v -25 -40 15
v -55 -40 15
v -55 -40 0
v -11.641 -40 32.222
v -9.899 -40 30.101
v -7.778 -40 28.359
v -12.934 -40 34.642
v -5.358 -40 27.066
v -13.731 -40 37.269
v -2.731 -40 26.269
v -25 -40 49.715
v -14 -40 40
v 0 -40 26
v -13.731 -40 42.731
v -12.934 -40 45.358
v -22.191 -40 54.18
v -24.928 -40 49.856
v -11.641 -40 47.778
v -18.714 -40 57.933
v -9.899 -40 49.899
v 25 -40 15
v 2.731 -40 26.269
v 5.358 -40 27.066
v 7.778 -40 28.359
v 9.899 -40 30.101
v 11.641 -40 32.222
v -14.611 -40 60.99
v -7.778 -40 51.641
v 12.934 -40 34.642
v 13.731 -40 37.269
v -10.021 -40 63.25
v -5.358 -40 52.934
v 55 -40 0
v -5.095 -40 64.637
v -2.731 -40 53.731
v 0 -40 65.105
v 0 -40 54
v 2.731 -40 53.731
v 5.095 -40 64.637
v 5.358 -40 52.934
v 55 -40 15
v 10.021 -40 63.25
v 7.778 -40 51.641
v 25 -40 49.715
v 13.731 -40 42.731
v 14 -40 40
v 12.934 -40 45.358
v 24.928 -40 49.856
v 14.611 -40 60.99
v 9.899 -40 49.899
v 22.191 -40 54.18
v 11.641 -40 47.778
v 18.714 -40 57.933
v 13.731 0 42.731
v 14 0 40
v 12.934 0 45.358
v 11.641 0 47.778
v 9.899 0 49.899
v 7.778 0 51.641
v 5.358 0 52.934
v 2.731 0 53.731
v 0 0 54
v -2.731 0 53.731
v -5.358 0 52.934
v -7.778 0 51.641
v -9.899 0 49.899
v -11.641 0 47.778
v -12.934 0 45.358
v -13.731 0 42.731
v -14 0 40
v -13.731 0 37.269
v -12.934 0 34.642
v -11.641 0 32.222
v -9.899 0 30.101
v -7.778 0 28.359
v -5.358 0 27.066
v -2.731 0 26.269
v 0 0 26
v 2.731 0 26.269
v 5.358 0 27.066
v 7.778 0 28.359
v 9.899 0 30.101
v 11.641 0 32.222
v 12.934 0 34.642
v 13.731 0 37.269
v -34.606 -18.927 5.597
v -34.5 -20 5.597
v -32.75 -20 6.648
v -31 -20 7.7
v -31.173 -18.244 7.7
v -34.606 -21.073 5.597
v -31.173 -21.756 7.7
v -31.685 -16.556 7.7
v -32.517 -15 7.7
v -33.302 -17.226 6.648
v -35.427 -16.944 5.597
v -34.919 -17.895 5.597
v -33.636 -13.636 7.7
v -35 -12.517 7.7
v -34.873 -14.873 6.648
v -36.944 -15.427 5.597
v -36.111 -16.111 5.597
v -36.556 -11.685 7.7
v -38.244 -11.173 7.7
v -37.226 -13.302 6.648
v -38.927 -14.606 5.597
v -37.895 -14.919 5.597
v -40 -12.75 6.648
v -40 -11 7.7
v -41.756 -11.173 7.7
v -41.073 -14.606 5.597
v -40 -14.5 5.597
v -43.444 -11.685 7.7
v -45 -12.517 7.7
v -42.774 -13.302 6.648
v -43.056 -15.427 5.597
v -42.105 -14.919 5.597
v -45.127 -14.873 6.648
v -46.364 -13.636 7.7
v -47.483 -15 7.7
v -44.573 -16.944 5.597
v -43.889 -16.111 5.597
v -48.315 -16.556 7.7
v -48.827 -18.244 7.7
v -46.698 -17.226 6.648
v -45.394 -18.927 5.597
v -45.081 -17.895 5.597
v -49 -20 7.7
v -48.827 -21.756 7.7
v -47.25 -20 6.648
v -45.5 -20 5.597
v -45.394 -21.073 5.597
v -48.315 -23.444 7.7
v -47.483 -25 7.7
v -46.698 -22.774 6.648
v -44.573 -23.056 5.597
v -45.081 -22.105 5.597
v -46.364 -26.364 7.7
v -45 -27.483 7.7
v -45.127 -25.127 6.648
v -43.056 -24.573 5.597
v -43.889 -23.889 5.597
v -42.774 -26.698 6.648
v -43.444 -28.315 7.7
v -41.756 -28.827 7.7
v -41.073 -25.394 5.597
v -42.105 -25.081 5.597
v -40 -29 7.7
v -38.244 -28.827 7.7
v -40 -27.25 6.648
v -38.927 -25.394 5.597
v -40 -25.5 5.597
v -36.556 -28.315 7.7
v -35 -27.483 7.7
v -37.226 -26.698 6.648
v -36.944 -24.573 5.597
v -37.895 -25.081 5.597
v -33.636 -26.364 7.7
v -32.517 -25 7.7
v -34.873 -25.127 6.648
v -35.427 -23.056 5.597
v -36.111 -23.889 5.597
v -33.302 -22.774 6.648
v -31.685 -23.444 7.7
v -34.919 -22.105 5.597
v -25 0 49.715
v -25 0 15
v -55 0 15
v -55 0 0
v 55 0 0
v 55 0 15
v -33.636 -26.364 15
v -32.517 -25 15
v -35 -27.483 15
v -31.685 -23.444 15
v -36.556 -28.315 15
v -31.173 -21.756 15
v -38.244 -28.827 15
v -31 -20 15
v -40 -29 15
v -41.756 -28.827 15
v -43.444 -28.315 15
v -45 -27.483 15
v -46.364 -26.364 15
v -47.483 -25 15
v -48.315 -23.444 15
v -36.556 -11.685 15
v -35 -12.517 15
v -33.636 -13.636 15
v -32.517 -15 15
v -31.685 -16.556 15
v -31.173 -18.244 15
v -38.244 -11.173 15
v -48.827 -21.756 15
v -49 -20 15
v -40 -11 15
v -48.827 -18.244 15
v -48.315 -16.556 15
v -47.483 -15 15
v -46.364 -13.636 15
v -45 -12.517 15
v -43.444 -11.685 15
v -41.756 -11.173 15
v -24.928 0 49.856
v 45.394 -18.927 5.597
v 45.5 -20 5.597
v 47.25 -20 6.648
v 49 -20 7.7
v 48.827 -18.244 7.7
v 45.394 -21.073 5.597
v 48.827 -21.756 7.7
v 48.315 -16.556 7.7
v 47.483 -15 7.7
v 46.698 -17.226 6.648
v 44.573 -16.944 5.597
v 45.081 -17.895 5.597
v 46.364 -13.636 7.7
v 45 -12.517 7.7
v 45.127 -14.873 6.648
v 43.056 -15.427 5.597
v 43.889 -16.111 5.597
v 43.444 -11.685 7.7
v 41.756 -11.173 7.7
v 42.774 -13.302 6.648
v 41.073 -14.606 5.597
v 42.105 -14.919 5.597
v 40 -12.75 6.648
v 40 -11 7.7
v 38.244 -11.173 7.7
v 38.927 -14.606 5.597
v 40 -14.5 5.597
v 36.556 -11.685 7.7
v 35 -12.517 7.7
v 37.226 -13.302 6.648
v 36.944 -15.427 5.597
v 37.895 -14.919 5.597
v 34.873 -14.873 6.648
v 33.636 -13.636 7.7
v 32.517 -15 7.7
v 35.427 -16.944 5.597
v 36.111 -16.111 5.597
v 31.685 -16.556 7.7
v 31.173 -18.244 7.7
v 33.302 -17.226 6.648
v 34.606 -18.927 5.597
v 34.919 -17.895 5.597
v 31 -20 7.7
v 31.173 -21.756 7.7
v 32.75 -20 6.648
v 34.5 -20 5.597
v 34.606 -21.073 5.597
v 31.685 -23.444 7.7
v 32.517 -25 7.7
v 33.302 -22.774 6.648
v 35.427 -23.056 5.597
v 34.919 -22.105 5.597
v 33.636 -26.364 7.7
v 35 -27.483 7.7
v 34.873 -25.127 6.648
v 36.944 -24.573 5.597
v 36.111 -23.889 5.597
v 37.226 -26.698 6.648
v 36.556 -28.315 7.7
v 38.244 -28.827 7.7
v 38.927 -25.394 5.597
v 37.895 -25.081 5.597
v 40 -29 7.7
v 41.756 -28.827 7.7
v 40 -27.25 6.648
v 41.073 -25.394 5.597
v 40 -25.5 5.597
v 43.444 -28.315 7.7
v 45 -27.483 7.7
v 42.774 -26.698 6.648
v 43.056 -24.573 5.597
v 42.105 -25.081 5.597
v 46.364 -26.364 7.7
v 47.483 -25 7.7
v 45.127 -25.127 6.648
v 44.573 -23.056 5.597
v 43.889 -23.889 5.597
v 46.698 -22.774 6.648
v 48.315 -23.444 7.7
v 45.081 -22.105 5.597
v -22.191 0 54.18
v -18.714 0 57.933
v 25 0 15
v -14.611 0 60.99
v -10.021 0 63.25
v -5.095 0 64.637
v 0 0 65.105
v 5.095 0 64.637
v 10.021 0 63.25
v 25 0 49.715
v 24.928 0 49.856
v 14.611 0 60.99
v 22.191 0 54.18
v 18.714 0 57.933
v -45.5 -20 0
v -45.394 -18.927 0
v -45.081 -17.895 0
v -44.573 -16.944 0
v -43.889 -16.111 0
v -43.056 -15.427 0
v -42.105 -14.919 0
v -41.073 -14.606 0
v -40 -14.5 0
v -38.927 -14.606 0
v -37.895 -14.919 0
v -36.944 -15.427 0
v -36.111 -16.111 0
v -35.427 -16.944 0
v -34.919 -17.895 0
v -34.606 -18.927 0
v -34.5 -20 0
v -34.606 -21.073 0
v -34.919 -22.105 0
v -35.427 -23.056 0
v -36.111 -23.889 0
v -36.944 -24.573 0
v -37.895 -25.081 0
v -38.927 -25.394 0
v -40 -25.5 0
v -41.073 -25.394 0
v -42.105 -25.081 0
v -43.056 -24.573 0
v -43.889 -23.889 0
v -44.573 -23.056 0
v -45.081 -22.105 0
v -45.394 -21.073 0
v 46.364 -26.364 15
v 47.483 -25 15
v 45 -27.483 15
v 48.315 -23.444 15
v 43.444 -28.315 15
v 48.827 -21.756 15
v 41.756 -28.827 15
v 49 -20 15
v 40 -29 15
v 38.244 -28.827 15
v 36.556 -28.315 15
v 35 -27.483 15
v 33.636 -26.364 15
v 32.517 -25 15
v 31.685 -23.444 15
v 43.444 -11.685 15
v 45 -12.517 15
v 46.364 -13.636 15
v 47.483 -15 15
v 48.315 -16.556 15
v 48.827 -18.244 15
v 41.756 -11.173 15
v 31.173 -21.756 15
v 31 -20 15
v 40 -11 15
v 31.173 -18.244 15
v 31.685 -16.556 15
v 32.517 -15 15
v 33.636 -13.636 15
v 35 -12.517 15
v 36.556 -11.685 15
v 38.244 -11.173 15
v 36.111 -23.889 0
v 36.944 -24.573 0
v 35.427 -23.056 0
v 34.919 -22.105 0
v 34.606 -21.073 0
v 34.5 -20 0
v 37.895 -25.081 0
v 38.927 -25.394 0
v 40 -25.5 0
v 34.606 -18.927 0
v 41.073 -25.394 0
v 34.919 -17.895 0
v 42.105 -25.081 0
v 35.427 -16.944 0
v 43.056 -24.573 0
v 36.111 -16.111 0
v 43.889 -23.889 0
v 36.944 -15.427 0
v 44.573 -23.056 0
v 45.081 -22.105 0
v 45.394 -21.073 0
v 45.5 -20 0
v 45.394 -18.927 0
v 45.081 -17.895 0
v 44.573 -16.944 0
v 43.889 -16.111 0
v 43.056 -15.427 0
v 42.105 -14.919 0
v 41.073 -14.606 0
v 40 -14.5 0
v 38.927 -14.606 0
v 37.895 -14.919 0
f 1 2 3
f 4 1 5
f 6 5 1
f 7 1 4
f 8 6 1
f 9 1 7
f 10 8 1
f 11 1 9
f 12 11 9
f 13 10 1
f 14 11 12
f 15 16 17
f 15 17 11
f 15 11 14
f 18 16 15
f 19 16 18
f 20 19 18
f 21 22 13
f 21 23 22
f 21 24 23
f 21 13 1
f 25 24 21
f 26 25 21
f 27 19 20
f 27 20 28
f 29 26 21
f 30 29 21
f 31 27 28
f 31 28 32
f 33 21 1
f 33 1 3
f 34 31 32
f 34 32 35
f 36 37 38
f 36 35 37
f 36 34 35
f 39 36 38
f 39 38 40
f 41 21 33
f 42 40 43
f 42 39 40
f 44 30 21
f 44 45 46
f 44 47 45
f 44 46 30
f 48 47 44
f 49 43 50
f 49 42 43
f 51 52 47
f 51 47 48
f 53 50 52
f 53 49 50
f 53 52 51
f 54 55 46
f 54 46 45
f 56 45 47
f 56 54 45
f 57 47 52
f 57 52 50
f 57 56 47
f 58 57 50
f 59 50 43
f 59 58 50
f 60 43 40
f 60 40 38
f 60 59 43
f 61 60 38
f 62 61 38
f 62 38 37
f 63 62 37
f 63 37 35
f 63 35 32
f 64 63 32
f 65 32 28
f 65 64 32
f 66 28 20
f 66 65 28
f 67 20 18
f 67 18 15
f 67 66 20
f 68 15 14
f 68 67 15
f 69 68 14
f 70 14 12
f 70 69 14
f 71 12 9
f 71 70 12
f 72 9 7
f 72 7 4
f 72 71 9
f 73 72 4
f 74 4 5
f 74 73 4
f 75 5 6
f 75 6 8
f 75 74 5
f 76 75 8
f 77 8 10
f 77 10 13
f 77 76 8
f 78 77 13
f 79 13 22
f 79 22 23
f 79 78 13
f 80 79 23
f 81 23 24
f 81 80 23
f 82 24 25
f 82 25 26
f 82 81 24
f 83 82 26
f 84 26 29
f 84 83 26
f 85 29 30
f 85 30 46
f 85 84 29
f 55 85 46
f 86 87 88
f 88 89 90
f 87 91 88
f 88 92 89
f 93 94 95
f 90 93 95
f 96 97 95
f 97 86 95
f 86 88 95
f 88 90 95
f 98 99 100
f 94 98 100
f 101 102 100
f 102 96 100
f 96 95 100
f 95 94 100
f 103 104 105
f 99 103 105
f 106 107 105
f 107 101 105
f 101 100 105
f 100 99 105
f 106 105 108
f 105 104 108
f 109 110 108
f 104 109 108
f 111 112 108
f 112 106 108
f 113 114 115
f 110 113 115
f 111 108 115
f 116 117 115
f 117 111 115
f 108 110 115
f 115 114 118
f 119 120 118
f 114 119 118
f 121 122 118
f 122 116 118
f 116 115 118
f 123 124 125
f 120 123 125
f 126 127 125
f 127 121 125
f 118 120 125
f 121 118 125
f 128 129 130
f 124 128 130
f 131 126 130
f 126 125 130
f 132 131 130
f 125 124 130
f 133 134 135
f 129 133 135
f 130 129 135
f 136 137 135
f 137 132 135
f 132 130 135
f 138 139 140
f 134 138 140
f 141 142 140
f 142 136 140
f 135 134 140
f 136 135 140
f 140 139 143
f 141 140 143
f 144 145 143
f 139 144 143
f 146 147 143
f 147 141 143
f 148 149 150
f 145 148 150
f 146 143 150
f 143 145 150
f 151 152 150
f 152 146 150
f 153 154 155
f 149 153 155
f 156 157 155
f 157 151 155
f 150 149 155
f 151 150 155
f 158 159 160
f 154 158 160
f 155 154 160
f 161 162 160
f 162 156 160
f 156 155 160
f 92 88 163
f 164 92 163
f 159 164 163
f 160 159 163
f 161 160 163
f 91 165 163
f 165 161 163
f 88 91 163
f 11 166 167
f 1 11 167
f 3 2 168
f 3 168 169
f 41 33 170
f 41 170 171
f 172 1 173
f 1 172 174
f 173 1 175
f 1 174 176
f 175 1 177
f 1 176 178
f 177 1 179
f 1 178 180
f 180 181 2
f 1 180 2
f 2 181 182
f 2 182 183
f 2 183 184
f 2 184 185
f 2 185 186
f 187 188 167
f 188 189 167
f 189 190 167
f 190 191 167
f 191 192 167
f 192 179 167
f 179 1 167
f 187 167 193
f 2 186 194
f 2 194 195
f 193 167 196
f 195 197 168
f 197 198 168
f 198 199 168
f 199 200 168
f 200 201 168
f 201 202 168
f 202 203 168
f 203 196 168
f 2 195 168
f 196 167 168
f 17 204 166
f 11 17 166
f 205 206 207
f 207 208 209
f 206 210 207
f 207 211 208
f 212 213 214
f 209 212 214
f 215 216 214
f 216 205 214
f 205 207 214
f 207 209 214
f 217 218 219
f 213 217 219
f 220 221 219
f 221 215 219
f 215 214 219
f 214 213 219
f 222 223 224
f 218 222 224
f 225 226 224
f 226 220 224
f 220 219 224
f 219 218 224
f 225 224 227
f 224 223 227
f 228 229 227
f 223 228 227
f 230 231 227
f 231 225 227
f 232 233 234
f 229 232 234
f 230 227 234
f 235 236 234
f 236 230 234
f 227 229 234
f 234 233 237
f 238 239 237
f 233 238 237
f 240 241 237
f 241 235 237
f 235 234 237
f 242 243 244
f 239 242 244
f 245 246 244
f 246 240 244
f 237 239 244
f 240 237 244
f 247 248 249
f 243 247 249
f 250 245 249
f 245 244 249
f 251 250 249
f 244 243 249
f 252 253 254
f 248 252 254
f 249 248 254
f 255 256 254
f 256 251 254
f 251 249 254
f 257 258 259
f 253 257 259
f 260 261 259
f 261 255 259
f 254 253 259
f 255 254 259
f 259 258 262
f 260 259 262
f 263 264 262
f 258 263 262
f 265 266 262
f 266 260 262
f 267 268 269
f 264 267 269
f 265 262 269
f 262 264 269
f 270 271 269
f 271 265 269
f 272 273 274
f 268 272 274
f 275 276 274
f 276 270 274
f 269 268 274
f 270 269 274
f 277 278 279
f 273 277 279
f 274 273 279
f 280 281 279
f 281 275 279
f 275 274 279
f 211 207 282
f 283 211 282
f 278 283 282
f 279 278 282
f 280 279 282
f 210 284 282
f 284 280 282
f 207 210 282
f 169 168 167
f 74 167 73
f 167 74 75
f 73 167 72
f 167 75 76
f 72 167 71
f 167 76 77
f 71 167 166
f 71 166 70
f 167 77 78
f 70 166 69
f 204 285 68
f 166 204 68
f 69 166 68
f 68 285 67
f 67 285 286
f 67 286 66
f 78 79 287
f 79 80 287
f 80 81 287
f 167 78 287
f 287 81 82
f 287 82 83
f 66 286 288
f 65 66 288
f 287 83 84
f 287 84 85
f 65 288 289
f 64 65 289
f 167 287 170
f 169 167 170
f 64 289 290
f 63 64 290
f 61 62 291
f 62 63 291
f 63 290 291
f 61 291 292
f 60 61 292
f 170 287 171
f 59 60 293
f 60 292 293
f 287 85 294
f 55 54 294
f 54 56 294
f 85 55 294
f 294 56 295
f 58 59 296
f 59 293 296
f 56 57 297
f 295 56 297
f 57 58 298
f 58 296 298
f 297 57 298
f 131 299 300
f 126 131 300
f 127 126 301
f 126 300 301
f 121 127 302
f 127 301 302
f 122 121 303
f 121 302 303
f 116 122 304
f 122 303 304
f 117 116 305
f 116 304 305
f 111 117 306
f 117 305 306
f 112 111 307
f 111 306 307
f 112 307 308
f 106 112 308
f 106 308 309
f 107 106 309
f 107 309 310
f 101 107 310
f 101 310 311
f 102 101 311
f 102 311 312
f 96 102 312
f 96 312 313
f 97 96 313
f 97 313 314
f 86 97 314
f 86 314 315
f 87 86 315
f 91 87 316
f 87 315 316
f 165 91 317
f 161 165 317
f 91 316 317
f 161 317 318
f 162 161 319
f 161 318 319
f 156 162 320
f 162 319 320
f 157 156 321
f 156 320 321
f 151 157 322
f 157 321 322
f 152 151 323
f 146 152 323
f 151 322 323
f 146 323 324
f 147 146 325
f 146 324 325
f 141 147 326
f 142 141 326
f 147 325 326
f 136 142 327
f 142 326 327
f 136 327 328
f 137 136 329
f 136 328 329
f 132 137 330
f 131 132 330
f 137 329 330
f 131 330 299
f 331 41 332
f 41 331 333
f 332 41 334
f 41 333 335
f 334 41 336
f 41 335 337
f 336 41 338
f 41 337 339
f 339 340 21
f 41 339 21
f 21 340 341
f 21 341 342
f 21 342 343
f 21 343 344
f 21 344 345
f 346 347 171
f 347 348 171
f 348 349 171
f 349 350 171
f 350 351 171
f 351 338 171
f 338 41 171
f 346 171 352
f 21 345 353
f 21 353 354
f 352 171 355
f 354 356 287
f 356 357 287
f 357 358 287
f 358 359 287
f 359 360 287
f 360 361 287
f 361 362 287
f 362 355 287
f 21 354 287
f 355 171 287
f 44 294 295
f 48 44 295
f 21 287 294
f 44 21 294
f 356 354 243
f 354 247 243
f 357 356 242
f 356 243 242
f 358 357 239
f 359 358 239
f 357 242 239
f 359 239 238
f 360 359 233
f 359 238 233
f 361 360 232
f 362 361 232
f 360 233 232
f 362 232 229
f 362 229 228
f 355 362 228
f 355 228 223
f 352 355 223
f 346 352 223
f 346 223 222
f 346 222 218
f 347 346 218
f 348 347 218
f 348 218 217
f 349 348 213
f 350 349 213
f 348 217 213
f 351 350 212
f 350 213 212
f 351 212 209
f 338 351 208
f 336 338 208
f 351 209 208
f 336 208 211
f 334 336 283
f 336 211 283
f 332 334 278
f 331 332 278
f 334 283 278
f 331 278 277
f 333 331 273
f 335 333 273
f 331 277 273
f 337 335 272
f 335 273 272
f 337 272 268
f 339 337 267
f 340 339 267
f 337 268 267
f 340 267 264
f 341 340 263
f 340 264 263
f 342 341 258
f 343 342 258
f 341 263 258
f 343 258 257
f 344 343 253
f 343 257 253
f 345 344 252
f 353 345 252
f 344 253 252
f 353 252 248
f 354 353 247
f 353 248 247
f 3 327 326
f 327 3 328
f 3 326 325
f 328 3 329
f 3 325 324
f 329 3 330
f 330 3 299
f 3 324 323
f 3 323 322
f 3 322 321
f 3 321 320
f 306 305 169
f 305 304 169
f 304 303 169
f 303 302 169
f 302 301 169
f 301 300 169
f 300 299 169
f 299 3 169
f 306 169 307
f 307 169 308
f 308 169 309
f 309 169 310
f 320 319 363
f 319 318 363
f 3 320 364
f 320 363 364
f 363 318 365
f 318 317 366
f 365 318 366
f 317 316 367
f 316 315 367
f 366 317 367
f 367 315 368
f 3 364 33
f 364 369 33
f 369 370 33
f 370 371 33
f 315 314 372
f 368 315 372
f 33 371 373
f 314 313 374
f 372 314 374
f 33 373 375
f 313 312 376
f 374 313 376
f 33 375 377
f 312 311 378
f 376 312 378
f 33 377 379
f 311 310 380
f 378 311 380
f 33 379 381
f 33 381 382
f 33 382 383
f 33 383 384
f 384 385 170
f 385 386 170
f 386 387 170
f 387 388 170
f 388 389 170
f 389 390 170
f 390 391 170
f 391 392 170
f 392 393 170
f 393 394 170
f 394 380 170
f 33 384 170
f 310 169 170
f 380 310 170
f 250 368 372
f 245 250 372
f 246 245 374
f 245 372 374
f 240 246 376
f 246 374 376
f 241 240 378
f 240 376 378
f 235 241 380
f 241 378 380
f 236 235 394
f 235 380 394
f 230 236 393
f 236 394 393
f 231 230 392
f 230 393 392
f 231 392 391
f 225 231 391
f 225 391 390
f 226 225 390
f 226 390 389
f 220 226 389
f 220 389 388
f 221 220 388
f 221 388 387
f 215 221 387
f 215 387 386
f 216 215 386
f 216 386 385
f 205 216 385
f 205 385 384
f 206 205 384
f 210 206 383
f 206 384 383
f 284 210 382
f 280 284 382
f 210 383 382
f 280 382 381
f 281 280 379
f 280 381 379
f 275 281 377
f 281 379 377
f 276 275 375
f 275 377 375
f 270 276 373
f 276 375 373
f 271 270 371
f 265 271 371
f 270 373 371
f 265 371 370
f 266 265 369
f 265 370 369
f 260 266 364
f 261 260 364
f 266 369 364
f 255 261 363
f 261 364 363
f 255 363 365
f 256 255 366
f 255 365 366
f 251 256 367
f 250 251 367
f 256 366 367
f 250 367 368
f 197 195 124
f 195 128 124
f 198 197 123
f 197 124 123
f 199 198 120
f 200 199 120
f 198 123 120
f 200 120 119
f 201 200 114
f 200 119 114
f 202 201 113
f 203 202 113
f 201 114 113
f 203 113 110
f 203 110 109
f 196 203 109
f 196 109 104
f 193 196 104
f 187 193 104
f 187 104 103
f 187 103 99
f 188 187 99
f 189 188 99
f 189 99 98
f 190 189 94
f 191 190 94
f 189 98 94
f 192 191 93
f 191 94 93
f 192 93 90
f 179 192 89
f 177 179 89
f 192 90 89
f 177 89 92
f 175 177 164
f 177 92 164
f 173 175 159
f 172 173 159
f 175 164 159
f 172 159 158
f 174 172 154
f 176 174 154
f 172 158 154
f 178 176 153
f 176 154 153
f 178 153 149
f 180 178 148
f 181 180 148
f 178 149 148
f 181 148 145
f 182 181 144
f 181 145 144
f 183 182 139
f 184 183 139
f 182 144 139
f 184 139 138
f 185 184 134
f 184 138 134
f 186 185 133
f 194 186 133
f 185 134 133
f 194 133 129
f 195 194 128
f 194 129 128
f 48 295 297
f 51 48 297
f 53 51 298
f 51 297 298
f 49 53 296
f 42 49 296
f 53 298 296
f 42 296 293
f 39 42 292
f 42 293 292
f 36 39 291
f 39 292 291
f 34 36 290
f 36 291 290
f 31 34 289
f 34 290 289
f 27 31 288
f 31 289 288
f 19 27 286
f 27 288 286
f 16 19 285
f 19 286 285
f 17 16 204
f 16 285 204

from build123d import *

# Parameters (mm, degrees)
F0_R     = 14
F1_DEPTH = 40
F3_D     = 18
F3_DEPTH = 7.3
F3_TIP   = 5.4077455712
F4_D     = 11
F4_DEPTH = 15
F4_TIP   = 3.3047334047


with BuildPart() as f1:
    # F0 (on Front) → F1 (new body)
    with BuildSketch(Plane.XZ):
        with BuildLine():
            Line((-55, 15), (-55, 0))
            Line((-55, 0), (55, 0))
            Line((55, 0), (55, 15))
            Line((55, 15), (25, 15))
            Line((25, 15), (25, 49.7154739381))
            Line((25, 49.7154739381), (24.9280575663, 49.8561188579))
            ThreePointArc((24.9280575663, 49.8561188579), (0, 65.1049641661), (-24.9280575663, 49.8561188579))
            Line((-24.9280575663, 49.8561188579), (-25, 49.7154739381))
            Line((-25, 49.7154739381), (-25, 15))
            Line((-25, 15), (-55, 15))
        make_face()
        with Locations((0, 40)):
            Circle(F0_R, mode=Mode.SUBTRACT)
    extrude(amount=F1_DEPTH)

    # F3
    with Locations(Plane.XY.offset(15)):
        with Locations((-40, -20), (40, -20)):
            Hole(F3_D / 2, depth=F3_DEPTH)
            with Locations((0, 0, -(F3_DEPTH + F3_TIP / 2))):  # 118° drill point
                Cone(0, F3_D / 2, F3_TIP, mode=Mode.SUBTRACT)

    # F4
    with Locations(Plane.XY.offset(15)):
        with Locations((-40, -20), (40, -20)):
            Hole(F4_D / 2, depth=F4_DEPTH)
            with Locations((0, 0, -(F4_DEPTH + F4_TIP / 2))):  # 118° drill point
                Cone(0, F4_D / 2, F4_TIP, mode=Mode.SUBTRACT)


solid = f1.part
